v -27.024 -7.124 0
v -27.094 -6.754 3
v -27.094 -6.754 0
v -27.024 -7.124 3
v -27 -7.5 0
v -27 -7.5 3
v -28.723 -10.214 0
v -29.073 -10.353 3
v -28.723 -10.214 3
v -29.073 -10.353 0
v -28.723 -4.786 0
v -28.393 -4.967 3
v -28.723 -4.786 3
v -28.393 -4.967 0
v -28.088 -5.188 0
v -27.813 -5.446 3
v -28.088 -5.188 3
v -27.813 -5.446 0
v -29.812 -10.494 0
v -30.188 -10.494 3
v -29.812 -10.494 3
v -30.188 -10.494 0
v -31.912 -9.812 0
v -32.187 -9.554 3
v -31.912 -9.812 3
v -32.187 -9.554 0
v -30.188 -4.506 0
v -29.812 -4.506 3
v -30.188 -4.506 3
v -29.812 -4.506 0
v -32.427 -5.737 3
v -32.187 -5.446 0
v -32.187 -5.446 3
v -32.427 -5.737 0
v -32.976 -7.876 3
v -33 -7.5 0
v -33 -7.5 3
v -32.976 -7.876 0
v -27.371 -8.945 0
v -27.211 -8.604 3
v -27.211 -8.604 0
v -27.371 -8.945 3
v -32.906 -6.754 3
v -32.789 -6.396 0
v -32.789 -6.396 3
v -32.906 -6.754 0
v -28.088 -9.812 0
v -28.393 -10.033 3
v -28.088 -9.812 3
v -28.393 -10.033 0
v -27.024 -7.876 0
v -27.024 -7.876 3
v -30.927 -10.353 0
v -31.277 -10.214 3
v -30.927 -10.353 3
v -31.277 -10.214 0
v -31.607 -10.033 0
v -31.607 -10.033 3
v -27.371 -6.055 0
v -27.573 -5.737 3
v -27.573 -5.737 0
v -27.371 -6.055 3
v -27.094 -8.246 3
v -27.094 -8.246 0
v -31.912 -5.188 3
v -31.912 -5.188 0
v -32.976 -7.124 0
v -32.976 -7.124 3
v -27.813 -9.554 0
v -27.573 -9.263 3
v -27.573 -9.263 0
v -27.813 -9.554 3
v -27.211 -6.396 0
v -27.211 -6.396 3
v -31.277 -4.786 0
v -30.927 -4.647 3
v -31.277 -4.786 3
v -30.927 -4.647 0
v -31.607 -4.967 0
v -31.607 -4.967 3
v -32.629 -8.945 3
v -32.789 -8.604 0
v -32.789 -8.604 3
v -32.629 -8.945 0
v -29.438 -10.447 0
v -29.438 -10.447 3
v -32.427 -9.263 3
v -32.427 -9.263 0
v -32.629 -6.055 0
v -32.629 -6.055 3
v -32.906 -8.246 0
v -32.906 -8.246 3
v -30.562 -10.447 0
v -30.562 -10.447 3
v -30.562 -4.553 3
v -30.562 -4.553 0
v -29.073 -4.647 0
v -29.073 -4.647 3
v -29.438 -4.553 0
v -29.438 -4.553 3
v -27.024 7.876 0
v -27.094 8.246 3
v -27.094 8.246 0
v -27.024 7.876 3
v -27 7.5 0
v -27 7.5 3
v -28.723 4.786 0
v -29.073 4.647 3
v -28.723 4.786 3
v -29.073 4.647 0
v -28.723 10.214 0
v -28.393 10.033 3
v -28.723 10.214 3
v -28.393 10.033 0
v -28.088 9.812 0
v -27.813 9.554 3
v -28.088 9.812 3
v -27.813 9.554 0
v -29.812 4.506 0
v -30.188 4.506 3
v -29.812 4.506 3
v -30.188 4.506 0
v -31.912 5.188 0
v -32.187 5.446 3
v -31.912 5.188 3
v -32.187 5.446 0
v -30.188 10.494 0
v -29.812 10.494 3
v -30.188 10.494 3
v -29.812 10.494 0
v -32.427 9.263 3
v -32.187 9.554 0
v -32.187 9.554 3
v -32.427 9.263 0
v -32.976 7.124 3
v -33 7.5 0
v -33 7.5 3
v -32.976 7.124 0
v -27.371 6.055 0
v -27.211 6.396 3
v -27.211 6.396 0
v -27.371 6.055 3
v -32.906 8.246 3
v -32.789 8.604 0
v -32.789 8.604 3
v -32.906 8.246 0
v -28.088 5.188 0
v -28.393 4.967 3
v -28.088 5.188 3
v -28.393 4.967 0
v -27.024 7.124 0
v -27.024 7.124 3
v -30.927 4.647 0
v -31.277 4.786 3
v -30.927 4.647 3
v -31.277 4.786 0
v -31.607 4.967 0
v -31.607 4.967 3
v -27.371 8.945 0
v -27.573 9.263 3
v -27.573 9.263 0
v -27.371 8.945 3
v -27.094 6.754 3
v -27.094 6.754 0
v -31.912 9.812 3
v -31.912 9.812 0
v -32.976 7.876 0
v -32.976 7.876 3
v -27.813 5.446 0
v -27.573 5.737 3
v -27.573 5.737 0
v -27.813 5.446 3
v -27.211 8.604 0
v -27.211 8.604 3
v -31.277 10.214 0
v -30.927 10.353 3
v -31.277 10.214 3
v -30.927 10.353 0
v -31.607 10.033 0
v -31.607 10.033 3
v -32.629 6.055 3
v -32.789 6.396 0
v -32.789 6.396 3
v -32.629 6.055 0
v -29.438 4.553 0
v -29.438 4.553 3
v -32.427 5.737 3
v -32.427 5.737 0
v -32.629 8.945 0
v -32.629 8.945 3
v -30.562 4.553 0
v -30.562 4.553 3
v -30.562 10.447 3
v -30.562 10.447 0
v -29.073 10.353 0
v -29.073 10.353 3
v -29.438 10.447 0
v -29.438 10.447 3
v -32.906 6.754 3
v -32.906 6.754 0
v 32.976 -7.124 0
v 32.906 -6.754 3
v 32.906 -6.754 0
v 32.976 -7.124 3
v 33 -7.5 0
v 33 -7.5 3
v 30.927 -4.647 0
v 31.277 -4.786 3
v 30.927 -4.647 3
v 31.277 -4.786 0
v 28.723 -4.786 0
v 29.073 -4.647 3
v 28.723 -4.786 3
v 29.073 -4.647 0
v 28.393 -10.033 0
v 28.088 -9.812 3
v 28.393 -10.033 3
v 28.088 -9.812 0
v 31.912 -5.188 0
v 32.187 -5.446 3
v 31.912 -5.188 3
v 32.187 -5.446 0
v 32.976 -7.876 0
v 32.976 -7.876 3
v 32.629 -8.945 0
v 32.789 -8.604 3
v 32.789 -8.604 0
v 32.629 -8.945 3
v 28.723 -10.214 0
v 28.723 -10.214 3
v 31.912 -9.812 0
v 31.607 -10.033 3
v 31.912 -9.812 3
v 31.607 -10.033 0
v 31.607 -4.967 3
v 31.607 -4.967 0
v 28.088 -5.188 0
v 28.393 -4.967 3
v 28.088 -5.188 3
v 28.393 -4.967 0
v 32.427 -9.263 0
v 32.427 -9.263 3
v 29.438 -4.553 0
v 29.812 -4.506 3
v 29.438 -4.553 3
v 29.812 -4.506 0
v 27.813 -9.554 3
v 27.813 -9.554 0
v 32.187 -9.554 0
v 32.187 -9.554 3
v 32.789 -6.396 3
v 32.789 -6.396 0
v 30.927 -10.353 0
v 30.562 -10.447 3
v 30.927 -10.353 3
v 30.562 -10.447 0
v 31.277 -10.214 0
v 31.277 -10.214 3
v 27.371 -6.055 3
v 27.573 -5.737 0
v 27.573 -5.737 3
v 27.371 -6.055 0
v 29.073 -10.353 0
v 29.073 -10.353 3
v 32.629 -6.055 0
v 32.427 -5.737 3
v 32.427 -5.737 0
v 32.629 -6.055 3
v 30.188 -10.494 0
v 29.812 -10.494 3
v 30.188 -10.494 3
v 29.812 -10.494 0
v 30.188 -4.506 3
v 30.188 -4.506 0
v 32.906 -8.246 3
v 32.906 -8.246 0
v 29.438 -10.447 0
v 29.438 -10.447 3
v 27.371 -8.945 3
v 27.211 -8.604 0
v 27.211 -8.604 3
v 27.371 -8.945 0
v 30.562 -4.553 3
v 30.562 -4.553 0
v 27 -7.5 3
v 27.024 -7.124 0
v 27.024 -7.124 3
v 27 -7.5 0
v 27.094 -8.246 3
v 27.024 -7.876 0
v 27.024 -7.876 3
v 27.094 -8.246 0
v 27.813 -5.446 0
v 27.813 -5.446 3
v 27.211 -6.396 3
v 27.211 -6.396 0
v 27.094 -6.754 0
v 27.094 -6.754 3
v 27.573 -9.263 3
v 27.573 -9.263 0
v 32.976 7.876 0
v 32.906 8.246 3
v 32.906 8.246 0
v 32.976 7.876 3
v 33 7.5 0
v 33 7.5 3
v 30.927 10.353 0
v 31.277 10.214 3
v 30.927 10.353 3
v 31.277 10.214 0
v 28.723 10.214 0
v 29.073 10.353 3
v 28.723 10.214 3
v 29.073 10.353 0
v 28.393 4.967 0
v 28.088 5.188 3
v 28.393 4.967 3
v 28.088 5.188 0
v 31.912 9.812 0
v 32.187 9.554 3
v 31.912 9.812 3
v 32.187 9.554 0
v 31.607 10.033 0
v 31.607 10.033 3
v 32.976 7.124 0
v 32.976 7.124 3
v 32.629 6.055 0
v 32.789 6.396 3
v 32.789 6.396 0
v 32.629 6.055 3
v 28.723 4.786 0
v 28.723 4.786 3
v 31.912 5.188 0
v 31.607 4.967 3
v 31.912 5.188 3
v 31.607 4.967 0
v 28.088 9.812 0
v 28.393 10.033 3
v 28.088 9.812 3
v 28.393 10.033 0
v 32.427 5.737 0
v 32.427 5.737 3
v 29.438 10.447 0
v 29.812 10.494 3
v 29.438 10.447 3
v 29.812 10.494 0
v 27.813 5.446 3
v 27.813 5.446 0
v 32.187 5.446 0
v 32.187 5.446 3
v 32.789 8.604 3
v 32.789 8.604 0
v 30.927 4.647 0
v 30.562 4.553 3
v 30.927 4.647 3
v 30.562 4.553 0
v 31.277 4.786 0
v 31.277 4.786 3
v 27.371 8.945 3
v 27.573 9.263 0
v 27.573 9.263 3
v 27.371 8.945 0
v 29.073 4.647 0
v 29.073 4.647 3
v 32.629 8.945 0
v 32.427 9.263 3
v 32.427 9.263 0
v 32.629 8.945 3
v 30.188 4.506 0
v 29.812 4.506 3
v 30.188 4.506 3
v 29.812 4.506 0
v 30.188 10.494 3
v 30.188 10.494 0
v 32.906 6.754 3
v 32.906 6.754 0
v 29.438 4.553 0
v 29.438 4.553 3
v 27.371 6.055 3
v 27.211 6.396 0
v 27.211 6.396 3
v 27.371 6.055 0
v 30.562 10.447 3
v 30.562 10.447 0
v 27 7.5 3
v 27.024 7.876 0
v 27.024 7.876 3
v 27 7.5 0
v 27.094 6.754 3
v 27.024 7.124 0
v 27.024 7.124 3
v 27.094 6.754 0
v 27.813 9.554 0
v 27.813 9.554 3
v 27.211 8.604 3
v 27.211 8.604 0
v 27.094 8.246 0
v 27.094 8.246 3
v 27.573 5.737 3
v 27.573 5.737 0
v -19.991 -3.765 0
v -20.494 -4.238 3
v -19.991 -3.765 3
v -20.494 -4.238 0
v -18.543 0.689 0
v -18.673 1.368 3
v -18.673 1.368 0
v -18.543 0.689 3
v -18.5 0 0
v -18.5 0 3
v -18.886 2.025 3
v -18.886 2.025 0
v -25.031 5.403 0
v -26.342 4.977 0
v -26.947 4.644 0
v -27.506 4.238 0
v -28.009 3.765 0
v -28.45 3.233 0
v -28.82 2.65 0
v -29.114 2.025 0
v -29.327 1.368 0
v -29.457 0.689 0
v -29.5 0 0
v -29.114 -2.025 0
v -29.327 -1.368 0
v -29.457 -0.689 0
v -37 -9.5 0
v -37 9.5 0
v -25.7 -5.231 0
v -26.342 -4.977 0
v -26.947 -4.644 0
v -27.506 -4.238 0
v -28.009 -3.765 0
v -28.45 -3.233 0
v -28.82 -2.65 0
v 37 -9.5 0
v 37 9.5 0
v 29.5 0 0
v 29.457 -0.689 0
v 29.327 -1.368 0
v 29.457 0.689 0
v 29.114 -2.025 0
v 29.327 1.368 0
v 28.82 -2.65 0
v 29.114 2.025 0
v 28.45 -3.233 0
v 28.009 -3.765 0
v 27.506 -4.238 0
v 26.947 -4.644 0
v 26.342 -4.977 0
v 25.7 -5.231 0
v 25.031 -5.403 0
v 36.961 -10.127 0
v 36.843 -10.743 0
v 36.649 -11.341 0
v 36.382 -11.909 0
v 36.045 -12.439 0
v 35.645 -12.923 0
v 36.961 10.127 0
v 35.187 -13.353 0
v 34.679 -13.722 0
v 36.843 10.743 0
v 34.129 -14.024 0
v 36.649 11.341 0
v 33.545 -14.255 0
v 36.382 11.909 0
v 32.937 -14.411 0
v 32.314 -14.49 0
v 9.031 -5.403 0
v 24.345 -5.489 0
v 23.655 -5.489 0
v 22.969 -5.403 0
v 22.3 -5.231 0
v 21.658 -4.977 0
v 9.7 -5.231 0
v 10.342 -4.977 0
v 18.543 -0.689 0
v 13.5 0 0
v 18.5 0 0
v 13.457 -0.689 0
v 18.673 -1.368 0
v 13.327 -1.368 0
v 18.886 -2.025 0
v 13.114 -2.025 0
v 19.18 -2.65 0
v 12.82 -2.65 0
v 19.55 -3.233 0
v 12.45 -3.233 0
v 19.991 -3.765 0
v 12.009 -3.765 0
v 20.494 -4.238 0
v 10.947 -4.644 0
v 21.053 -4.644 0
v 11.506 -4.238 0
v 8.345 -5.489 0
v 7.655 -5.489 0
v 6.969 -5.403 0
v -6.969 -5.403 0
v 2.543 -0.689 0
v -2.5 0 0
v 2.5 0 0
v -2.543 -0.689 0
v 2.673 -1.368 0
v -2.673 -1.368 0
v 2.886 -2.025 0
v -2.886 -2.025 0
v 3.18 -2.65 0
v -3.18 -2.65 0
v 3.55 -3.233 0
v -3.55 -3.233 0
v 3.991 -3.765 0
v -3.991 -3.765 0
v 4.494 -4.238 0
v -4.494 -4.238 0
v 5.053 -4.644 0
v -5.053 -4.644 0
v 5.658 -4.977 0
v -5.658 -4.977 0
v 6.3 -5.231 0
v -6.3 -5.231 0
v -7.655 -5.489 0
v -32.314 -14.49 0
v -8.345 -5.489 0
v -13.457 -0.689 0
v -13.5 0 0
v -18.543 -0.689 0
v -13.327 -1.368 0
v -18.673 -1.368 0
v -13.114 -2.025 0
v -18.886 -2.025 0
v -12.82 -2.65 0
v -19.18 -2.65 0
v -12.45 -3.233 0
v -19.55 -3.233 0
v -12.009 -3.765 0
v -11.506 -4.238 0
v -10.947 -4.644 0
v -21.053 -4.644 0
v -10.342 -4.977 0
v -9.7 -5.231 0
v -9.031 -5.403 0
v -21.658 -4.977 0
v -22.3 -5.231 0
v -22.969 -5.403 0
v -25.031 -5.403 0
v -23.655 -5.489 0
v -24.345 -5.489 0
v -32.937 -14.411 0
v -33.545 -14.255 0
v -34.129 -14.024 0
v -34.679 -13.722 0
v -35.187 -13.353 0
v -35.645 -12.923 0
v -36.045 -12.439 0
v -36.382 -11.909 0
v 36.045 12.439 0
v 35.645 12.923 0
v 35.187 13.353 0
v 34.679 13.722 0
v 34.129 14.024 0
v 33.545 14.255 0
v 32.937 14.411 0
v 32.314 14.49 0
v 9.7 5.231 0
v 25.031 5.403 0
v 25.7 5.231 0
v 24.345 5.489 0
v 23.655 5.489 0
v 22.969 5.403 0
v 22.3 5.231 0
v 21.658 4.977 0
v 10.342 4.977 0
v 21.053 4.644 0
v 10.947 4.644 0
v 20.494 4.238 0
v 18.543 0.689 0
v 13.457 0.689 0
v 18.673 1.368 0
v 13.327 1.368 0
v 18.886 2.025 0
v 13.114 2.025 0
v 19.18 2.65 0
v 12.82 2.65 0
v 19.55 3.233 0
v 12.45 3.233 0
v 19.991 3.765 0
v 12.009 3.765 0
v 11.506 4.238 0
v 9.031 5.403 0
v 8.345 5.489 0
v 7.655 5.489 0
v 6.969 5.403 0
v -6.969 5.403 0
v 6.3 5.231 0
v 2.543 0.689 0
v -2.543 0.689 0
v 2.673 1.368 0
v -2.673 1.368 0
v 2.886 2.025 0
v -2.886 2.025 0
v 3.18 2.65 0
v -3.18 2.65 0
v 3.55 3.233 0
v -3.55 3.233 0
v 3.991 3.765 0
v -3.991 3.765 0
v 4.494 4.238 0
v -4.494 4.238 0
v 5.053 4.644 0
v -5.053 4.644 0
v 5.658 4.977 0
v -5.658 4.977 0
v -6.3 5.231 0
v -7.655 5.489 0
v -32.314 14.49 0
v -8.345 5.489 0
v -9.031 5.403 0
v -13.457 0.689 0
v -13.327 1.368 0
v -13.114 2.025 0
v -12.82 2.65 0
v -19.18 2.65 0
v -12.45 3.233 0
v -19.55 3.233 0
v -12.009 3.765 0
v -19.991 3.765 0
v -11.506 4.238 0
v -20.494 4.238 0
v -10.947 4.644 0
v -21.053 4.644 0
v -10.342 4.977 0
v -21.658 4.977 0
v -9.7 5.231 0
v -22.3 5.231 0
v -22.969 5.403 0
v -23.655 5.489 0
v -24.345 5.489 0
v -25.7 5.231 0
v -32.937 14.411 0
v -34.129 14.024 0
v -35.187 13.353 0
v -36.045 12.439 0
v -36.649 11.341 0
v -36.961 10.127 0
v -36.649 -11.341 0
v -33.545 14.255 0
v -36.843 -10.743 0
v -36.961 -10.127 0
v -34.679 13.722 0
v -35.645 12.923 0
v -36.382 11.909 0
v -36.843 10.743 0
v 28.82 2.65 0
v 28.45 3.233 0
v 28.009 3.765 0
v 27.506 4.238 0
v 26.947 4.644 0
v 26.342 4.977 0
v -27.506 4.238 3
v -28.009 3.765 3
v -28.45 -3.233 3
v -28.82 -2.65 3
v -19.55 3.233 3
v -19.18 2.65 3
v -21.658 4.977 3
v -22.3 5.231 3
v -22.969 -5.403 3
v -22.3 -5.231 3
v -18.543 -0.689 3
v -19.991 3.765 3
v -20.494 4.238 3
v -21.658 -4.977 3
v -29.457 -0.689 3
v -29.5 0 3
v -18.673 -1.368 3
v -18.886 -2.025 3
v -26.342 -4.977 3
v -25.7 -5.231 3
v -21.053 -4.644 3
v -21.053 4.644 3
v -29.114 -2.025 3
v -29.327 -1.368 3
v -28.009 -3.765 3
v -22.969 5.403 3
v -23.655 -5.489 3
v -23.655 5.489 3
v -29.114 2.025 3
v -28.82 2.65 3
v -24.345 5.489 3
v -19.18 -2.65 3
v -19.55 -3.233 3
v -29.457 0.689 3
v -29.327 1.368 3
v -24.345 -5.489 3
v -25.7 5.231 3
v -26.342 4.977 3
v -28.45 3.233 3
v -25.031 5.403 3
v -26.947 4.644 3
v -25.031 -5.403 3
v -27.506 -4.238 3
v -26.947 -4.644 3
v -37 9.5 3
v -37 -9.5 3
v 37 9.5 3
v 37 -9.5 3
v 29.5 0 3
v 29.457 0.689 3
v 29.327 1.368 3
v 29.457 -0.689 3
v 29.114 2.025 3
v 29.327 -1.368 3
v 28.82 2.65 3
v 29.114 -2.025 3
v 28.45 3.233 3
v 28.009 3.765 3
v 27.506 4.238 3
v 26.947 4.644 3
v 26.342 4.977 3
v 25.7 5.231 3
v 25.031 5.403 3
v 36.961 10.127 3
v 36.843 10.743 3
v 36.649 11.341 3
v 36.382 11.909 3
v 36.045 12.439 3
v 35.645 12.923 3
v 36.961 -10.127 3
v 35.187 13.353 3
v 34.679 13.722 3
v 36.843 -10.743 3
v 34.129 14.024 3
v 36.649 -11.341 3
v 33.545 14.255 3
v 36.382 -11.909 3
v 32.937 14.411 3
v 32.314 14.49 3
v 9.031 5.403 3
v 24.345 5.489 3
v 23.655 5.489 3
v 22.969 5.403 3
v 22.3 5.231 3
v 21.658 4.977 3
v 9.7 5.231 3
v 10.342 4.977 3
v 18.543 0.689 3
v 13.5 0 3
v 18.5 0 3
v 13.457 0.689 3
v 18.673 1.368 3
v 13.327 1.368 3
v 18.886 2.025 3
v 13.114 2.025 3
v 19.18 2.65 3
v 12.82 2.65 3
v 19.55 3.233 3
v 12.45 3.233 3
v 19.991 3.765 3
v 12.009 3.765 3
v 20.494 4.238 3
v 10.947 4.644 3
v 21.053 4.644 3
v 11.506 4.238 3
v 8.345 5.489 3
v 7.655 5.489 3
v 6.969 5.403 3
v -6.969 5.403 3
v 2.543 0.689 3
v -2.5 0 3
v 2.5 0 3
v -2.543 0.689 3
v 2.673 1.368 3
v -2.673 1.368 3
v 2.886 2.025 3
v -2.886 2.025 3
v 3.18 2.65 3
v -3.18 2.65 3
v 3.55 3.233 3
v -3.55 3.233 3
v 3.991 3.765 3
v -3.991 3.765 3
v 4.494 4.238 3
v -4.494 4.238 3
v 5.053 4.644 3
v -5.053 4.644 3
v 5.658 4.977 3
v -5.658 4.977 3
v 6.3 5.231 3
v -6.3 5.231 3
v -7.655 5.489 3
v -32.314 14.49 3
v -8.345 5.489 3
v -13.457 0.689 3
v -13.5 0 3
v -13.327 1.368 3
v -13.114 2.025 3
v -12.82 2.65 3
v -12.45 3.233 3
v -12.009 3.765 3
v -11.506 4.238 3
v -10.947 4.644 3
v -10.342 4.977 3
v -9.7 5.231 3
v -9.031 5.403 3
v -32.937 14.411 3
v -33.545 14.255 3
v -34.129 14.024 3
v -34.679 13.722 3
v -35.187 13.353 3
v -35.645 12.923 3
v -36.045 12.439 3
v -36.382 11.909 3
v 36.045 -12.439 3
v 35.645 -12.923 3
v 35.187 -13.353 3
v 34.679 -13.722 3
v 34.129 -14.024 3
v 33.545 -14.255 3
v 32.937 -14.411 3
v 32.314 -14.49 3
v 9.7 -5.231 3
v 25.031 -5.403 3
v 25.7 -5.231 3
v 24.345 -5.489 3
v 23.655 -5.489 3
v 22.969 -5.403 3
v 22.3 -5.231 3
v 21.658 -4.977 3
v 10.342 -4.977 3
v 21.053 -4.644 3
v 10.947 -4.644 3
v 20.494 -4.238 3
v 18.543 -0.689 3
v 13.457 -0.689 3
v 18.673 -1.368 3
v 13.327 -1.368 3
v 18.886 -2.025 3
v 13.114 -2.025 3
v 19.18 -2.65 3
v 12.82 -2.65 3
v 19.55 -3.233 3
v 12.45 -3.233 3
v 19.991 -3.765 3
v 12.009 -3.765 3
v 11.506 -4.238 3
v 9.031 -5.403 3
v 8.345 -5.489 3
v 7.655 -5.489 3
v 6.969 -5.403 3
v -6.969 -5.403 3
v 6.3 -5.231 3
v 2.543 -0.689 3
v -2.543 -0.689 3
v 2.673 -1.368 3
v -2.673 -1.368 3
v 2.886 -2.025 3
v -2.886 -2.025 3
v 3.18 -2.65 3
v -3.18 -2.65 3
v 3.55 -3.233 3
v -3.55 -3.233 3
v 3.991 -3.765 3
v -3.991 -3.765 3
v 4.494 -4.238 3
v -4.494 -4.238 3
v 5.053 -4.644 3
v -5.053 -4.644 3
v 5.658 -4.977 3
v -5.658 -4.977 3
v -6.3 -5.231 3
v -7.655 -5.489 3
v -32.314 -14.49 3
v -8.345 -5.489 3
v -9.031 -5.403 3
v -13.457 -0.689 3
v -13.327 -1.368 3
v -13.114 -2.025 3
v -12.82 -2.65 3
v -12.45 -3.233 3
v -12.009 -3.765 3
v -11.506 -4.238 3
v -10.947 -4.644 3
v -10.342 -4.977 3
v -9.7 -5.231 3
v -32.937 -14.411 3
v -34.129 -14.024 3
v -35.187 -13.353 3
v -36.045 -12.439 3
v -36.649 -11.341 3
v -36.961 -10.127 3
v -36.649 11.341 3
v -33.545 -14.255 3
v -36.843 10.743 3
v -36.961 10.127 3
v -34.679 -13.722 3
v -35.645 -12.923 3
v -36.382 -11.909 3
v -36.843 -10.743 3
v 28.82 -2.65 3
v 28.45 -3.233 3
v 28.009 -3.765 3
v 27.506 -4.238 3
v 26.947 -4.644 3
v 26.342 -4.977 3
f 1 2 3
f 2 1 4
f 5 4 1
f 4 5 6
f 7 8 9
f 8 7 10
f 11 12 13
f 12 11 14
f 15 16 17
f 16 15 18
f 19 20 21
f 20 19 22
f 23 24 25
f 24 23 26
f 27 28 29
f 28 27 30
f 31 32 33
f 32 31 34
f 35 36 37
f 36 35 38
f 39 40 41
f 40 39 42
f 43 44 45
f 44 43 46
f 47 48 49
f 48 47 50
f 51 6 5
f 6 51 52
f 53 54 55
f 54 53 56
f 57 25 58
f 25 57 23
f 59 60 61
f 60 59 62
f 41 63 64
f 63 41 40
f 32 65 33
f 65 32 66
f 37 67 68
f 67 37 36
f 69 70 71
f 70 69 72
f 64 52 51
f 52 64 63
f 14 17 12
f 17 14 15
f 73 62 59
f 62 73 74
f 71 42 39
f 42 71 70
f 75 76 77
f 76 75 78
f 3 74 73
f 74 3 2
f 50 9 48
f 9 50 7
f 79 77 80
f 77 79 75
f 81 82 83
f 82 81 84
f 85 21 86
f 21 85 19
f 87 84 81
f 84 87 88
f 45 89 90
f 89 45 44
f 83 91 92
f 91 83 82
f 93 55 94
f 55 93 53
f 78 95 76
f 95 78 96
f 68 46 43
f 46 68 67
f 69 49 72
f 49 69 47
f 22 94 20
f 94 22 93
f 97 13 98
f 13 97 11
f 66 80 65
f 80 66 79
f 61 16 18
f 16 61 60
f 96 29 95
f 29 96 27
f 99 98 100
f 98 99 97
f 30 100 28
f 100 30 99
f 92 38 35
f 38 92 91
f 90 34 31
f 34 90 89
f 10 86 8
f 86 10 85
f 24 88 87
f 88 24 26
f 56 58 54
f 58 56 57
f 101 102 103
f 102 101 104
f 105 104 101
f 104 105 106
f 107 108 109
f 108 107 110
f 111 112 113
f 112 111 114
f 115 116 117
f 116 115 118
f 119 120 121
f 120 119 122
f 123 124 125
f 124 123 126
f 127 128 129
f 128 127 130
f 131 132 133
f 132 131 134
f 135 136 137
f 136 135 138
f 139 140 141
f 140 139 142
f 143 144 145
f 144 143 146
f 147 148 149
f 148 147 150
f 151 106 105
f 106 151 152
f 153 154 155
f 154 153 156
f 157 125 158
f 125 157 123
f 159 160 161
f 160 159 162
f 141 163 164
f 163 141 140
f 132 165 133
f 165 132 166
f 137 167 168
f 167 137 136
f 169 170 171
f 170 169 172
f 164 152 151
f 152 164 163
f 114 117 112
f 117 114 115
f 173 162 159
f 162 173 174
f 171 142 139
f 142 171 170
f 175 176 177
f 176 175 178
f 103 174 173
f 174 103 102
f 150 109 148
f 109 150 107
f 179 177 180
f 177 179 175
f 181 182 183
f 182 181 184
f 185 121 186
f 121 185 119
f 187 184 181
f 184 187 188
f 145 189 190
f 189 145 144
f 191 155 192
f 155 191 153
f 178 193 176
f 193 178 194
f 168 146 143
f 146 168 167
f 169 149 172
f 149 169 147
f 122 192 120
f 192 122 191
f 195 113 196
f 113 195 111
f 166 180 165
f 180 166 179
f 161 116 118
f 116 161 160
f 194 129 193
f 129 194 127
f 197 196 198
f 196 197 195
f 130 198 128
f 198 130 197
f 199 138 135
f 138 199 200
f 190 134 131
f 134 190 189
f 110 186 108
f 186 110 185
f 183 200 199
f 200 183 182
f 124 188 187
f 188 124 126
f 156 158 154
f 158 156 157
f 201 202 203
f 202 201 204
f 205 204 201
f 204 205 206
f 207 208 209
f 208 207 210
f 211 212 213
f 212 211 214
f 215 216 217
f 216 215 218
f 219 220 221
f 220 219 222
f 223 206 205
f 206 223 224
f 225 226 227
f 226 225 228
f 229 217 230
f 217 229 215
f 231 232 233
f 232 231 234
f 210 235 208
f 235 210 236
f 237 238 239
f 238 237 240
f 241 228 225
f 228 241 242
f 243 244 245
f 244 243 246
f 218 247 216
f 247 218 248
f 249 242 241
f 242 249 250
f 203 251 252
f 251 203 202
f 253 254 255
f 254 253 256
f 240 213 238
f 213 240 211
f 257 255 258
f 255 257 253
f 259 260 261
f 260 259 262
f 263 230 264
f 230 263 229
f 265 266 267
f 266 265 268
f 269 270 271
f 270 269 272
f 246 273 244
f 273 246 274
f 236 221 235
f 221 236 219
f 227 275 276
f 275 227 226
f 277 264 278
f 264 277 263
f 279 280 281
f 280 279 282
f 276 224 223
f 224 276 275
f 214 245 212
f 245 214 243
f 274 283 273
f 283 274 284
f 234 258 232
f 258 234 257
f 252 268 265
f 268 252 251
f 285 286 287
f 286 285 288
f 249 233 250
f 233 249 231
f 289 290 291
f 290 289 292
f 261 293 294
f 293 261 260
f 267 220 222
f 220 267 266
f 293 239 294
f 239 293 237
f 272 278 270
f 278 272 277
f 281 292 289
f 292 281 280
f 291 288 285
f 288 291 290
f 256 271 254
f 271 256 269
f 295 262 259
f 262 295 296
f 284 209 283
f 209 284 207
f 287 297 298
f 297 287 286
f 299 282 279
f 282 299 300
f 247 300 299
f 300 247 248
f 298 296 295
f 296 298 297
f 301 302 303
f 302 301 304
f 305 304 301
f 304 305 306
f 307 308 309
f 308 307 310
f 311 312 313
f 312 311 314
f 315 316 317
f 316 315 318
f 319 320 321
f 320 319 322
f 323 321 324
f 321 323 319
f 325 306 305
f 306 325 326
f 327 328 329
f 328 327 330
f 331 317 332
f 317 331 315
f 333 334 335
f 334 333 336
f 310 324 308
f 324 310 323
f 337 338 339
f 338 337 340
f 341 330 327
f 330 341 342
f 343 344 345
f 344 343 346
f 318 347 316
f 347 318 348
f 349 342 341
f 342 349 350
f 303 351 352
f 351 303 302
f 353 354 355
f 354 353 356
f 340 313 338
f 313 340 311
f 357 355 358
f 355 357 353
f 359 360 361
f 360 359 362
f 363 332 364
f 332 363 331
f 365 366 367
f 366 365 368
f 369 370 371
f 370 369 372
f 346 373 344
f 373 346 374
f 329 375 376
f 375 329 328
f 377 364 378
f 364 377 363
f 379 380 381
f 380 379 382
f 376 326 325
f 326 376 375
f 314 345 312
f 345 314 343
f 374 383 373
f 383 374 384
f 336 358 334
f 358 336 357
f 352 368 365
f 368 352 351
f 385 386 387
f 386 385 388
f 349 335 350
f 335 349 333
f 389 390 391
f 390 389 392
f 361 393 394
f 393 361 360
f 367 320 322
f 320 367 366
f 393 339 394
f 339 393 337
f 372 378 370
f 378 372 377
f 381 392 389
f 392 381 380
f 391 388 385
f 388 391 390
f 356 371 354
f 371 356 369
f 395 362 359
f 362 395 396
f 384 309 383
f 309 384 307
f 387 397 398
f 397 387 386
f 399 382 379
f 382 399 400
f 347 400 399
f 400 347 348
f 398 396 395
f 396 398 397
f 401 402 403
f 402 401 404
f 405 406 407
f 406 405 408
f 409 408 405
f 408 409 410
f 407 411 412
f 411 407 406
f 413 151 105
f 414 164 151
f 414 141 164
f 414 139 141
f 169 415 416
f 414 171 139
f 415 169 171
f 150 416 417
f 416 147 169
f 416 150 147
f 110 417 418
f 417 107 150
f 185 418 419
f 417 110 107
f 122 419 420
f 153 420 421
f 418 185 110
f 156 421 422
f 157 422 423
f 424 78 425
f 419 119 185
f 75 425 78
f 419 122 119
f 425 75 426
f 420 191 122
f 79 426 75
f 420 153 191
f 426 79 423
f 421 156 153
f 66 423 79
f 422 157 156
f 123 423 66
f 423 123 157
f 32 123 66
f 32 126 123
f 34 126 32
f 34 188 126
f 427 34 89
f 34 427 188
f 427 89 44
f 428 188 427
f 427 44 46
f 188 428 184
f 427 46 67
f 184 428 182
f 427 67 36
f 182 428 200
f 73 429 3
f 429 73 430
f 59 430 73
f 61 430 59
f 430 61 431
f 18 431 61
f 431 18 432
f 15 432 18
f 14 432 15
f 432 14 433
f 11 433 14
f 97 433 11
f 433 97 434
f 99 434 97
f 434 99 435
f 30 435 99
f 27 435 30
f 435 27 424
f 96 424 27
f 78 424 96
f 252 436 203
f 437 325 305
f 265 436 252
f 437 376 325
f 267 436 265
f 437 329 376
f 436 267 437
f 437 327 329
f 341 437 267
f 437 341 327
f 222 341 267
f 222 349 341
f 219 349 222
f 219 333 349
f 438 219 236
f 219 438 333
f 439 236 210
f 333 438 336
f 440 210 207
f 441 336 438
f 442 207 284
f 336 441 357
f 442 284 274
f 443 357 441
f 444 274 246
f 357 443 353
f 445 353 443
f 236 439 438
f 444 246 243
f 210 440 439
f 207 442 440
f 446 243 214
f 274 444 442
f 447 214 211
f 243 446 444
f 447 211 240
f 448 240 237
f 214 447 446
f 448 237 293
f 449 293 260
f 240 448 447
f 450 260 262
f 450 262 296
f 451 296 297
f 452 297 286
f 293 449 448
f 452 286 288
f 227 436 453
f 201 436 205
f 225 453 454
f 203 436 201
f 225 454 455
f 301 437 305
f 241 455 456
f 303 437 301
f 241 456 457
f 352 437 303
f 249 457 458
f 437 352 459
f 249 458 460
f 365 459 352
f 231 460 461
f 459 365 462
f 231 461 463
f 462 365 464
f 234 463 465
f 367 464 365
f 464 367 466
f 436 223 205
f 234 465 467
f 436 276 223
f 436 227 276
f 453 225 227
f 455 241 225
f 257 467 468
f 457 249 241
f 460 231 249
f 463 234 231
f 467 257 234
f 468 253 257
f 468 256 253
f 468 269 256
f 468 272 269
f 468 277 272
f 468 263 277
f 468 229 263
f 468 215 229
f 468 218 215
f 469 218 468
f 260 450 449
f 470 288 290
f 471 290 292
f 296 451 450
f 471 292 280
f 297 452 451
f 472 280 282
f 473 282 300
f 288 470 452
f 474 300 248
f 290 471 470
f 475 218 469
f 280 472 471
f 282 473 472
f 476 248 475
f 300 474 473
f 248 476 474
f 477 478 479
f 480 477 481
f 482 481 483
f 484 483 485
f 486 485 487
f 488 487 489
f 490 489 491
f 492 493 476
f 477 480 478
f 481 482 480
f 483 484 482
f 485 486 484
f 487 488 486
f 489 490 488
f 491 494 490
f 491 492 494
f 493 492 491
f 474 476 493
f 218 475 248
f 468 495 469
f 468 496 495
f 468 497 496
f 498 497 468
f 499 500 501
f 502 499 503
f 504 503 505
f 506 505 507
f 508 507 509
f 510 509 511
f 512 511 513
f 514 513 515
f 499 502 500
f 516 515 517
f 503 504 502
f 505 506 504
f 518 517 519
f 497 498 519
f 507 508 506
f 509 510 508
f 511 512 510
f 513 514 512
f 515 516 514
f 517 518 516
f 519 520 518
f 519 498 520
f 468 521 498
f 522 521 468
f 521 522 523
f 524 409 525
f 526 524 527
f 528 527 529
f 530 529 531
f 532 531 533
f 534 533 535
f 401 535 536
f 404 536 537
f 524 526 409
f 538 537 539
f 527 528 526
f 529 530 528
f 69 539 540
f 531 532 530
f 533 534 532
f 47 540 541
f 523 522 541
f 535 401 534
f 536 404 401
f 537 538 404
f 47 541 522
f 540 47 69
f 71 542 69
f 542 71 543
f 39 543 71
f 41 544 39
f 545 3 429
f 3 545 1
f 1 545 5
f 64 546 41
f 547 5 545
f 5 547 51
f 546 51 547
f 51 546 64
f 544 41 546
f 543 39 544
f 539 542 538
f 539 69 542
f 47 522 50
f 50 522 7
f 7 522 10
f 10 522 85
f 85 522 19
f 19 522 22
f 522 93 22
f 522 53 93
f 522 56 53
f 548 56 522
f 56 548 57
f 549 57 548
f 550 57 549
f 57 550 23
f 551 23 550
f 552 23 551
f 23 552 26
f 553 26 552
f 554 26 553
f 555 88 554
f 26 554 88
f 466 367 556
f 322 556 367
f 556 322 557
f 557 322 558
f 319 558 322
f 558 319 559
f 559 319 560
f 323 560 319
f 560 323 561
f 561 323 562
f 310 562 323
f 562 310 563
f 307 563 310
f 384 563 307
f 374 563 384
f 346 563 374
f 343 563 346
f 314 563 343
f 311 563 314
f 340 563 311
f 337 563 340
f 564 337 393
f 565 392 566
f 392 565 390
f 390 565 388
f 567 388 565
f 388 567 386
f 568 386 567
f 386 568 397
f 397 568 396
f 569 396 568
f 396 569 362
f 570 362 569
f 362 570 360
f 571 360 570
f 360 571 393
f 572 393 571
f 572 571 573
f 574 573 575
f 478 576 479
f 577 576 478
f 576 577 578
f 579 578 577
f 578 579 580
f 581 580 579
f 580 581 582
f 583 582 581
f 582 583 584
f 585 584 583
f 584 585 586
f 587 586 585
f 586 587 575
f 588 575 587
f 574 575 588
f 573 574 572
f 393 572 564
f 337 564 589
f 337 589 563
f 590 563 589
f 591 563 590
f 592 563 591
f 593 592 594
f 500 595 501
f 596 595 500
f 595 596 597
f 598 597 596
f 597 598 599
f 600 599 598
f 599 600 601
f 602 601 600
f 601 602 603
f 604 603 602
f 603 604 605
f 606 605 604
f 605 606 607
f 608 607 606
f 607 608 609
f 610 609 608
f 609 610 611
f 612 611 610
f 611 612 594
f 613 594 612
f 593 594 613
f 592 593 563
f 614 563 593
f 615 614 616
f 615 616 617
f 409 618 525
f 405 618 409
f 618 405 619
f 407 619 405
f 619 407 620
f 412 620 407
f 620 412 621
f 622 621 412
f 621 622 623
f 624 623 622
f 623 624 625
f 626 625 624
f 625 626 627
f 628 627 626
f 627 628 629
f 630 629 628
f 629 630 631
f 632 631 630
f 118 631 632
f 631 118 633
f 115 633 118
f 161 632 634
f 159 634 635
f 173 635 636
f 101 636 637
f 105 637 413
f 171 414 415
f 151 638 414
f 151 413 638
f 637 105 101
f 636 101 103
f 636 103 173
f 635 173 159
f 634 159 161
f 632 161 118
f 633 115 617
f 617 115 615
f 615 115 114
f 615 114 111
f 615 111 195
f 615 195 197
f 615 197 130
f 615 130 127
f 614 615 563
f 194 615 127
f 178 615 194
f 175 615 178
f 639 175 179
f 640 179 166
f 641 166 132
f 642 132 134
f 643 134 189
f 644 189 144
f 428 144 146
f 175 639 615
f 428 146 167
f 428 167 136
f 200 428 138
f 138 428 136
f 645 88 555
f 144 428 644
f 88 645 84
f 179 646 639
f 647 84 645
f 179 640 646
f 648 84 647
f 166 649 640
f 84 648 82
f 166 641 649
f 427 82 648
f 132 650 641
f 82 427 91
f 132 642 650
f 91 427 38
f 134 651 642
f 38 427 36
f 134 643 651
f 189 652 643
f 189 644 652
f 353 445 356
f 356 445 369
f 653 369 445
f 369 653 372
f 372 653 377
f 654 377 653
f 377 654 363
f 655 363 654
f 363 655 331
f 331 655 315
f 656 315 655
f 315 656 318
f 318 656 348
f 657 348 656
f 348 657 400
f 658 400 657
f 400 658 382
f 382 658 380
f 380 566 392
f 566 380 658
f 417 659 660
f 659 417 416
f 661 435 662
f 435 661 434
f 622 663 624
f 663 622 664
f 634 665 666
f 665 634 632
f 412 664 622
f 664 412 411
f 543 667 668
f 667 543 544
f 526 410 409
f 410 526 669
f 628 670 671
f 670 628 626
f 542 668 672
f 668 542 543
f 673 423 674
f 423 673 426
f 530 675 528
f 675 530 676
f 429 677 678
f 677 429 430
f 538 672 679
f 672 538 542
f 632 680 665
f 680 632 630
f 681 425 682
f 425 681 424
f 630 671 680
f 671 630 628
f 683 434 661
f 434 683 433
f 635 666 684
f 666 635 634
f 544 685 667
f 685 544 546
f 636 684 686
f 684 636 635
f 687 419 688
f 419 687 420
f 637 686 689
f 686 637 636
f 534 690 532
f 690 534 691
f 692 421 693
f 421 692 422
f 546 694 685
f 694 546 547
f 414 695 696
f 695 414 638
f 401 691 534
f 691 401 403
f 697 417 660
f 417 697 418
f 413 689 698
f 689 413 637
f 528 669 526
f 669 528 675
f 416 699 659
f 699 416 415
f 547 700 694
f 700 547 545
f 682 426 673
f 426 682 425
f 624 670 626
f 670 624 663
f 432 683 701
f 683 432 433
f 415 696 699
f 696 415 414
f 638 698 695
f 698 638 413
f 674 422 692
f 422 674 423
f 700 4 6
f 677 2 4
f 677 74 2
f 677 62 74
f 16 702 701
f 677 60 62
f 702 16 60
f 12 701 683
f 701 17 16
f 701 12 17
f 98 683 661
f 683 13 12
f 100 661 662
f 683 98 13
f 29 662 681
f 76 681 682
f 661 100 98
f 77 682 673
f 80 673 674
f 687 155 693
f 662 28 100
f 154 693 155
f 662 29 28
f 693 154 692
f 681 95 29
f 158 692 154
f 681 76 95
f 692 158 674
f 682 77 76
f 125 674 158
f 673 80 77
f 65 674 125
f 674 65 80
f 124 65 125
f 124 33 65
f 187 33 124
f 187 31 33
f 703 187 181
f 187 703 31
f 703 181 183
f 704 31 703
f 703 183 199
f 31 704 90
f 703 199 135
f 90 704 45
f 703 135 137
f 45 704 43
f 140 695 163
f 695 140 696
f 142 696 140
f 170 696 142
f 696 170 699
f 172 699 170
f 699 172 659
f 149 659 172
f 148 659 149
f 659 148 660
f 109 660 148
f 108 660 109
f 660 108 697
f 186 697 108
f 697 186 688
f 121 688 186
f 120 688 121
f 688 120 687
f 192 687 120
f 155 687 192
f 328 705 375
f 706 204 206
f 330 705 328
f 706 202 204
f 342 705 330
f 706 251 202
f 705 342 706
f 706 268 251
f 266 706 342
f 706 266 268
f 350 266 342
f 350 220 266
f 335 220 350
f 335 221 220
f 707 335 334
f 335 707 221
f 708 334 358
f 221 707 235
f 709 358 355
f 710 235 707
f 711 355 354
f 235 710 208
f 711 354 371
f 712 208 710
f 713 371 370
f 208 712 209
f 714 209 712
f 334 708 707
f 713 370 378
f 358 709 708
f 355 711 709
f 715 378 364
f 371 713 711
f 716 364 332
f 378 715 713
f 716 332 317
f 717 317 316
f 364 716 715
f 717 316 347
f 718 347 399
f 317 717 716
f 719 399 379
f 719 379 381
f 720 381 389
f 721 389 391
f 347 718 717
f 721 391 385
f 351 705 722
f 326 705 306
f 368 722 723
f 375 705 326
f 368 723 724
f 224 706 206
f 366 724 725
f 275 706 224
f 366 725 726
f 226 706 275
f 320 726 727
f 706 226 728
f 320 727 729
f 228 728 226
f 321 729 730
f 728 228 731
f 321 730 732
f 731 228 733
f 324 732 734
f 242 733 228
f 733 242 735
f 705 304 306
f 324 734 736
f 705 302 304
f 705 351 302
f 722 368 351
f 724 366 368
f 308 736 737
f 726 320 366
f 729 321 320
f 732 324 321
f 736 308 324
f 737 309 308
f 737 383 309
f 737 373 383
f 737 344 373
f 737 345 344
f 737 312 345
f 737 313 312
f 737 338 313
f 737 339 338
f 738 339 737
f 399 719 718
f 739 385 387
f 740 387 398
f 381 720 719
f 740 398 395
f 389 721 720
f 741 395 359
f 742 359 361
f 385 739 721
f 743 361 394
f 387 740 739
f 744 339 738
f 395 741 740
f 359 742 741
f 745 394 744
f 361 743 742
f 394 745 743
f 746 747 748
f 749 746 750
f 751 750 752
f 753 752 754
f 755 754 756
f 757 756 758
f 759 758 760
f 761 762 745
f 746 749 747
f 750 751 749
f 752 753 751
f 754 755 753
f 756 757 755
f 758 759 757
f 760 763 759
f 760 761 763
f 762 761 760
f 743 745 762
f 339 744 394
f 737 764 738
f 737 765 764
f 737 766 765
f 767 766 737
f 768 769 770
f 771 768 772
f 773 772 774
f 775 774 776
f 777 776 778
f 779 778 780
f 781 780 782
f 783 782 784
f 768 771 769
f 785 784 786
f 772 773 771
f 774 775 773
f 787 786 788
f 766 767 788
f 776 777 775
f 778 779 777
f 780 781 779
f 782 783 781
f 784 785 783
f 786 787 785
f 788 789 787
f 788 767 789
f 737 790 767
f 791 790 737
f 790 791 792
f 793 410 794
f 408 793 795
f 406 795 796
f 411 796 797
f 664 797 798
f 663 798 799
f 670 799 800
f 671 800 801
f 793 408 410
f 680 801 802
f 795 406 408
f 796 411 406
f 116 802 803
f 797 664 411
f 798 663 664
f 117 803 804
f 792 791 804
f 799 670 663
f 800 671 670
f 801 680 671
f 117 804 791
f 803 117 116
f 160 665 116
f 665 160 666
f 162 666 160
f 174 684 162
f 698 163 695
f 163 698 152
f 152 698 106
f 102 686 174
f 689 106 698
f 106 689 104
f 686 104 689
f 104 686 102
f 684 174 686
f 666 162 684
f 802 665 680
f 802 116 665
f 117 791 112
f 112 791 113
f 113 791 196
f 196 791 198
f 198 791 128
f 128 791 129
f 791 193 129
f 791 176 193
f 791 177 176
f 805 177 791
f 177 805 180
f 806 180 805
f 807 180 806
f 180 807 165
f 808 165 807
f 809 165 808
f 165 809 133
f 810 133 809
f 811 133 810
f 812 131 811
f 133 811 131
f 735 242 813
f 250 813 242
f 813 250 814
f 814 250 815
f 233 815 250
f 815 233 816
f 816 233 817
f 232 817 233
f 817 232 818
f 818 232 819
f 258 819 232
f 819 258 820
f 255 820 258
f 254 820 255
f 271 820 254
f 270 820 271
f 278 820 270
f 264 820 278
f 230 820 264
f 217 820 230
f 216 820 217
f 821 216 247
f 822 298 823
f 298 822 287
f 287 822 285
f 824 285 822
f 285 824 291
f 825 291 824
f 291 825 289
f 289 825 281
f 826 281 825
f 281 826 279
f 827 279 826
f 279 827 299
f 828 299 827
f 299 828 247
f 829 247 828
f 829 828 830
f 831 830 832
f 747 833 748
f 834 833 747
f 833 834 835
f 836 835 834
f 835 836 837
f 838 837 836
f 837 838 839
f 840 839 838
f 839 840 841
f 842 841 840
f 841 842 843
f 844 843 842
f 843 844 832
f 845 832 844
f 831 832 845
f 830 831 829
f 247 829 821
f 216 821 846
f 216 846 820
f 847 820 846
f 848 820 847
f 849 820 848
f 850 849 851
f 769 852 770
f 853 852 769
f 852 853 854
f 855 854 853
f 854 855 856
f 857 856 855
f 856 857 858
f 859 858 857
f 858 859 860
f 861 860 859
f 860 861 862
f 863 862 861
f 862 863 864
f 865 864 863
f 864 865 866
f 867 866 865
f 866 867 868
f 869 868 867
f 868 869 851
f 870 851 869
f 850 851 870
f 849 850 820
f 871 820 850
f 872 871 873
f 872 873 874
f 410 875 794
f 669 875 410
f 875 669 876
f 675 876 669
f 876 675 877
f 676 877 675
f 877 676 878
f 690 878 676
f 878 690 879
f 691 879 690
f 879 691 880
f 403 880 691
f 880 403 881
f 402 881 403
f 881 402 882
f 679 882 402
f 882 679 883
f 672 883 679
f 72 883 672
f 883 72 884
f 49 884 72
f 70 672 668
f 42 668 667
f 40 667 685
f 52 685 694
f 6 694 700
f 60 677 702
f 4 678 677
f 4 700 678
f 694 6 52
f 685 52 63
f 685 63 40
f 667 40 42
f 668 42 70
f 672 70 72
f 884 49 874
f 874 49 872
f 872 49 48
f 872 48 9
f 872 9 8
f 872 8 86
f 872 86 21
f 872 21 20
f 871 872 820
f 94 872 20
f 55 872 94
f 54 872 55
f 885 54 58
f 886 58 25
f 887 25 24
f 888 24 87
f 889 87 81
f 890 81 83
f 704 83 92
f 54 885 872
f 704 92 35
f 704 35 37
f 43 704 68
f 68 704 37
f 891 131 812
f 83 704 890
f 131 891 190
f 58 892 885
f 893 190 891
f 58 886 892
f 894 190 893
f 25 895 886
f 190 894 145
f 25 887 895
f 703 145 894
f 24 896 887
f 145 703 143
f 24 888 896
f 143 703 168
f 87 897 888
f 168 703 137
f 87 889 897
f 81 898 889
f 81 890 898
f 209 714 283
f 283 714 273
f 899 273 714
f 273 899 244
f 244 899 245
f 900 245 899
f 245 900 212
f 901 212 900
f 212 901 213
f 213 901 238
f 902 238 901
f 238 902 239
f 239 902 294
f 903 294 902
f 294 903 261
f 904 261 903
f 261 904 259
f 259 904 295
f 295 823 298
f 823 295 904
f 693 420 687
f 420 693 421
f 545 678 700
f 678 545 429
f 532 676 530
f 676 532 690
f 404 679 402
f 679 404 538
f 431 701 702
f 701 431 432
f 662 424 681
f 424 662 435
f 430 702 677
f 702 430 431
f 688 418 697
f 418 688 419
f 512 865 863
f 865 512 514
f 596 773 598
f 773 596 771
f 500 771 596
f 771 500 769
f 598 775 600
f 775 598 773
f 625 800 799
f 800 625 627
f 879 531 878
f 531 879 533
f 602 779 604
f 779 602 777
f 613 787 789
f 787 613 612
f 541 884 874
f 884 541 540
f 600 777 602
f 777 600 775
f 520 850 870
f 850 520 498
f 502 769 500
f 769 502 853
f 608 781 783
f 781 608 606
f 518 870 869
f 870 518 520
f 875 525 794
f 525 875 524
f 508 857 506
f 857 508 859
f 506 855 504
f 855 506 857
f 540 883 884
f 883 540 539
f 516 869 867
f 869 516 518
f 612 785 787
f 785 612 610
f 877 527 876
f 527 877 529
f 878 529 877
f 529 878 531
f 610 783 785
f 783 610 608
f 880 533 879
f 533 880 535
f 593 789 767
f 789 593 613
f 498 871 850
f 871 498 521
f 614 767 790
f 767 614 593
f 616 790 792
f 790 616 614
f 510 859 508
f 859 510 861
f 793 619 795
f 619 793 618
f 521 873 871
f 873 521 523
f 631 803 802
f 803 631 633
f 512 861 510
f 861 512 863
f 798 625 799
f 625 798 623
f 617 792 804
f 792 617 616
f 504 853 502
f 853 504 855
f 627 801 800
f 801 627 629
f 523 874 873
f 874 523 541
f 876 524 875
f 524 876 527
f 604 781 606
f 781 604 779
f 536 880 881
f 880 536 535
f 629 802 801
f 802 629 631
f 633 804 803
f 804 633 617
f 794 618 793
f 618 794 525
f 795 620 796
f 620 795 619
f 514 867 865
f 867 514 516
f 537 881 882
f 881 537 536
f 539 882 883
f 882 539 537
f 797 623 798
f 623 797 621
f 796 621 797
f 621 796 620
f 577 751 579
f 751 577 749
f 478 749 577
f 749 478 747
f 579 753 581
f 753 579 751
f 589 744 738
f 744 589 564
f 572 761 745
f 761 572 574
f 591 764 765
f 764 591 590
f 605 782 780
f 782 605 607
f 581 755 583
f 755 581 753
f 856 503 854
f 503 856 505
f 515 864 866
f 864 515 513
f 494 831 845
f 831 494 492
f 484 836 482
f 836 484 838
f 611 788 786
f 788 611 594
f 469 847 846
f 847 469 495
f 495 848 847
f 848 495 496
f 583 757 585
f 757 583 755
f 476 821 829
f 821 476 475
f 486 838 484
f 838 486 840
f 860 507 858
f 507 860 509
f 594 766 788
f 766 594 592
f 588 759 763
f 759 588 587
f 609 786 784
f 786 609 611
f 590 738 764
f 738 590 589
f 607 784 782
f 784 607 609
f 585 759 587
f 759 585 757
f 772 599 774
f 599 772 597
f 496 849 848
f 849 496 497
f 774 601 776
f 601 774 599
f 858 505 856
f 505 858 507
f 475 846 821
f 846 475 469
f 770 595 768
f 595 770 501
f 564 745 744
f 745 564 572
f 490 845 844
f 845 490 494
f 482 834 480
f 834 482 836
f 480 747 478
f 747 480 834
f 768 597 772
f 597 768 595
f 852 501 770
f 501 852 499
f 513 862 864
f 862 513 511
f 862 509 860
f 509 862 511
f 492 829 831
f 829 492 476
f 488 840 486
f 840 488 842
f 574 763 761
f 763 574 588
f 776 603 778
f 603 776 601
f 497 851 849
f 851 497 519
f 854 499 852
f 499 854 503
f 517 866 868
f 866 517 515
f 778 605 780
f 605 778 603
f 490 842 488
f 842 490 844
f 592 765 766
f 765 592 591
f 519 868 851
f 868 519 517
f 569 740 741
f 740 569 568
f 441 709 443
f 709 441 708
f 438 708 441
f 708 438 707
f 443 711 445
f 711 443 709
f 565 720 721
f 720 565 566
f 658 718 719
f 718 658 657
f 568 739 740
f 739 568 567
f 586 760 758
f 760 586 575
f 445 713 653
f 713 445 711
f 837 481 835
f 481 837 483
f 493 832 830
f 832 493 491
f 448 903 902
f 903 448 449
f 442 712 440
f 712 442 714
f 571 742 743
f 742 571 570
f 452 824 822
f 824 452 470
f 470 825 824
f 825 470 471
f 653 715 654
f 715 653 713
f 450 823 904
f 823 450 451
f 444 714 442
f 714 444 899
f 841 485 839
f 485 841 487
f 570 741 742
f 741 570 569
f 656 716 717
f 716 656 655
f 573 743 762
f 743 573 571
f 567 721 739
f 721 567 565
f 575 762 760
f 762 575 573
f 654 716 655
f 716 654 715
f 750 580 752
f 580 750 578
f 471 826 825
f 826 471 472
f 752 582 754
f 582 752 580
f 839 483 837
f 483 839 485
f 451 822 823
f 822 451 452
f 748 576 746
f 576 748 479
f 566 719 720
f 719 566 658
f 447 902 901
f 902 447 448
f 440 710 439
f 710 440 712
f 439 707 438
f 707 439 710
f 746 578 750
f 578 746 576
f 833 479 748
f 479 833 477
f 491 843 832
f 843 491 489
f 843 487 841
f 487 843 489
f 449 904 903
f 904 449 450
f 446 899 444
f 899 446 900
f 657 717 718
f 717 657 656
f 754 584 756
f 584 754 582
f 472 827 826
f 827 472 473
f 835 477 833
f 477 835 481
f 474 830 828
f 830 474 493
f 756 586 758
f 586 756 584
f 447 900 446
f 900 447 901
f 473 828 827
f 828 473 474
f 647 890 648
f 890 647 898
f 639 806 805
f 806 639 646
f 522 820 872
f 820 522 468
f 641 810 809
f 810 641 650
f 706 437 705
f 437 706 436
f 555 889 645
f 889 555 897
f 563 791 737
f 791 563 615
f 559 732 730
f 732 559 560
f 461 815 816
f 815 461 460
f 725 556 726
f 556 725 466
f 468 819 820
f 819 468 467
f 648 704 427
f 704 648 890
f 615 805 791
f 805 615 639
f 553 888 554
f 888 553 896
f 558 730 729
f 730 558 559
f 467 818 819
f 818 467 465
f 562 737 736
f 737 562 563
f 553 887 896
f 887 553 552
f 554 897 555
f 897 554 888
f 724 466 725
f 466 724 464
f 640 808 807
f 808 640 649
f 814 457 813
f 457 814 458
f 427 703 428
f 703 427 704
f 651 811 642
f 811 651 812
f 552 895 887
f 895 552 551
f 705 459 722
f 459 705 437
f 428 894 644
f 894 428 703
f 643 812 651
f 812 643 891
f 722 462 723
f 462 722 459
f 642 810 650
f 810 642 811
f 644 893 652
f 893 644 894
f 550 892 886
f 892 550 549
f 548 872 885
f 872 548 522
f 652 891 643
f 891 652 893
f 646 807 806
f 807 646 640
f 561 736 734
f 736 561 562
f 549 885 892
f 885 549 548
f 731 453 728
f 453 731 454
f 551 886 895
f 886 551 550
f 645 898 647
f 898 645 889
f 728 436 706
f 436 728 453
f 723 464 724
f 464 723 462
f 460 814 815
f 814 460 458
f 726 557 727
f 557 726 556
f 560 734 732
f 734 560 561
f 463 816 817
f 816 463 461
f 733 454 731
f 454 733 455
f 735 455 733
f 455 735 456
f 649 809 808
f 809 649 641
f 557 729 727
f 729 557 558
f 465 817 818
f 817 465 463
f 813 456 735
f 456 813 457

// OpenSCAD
$fn = 50;


difference() {
	union() {
		hull() {
			translate(v = [-32.0000000000, 9.5000000000, 0]) {
				cylinder(h = 3, r = 5);
			}
			translate(v = [32.0000000000, 9.5000000000, 0]) {
				cylinder(h = 3, r = 5);
			}
			translate(v = [-32.0000000000, -9.5000000000, 0]) {
				cylinder(h = 3, r = 5);
			}
			translate(v = [32.0000000000, -9.5000000000, 0]) {
				cylinder(h = 3, r = 5);
			}
		}
	}
	union() {
		#translate(v = [-30.0000000000, -7.5000000000, -100.0000000000]) {
			cylinder(h = 200, r = 3.0000000000);
		}
		#translate(v = [-30.0000000000, 7.5000000000, -100.0000000000]) {
			cylinder(h = 200, r = 3.0000000000);
		}
		#translate(v = [30.0000000000, -7.5000000000, -100.0000000000]) {
			cylinder(h = 200, r = 3.0000000000);
		}
		#translate(v = [30.0000000000, 7.5000000000, -100.0000000000]) {
			cylinder(h = 200, r = 3.0000000000);
		}
		#translate(v = [-24.0000000000, 0, 0]) {
			cylinder(h = 3, r = 5.5000000000);
		}
		#translate(v = [-8.0000000000, 0, 0]) {
			cylinder(h = 3, r = 5.5000000000);
		}
		#translate(v = [8.0000000000, 0, 0]) {
			cylinder(h = 3, r = 5.5000000000);
		}
		#translate(v = [24.0000000000, 0, 0]) {
			cylinder(h = 3, r = 5.5000000000);
		}
	}
}
